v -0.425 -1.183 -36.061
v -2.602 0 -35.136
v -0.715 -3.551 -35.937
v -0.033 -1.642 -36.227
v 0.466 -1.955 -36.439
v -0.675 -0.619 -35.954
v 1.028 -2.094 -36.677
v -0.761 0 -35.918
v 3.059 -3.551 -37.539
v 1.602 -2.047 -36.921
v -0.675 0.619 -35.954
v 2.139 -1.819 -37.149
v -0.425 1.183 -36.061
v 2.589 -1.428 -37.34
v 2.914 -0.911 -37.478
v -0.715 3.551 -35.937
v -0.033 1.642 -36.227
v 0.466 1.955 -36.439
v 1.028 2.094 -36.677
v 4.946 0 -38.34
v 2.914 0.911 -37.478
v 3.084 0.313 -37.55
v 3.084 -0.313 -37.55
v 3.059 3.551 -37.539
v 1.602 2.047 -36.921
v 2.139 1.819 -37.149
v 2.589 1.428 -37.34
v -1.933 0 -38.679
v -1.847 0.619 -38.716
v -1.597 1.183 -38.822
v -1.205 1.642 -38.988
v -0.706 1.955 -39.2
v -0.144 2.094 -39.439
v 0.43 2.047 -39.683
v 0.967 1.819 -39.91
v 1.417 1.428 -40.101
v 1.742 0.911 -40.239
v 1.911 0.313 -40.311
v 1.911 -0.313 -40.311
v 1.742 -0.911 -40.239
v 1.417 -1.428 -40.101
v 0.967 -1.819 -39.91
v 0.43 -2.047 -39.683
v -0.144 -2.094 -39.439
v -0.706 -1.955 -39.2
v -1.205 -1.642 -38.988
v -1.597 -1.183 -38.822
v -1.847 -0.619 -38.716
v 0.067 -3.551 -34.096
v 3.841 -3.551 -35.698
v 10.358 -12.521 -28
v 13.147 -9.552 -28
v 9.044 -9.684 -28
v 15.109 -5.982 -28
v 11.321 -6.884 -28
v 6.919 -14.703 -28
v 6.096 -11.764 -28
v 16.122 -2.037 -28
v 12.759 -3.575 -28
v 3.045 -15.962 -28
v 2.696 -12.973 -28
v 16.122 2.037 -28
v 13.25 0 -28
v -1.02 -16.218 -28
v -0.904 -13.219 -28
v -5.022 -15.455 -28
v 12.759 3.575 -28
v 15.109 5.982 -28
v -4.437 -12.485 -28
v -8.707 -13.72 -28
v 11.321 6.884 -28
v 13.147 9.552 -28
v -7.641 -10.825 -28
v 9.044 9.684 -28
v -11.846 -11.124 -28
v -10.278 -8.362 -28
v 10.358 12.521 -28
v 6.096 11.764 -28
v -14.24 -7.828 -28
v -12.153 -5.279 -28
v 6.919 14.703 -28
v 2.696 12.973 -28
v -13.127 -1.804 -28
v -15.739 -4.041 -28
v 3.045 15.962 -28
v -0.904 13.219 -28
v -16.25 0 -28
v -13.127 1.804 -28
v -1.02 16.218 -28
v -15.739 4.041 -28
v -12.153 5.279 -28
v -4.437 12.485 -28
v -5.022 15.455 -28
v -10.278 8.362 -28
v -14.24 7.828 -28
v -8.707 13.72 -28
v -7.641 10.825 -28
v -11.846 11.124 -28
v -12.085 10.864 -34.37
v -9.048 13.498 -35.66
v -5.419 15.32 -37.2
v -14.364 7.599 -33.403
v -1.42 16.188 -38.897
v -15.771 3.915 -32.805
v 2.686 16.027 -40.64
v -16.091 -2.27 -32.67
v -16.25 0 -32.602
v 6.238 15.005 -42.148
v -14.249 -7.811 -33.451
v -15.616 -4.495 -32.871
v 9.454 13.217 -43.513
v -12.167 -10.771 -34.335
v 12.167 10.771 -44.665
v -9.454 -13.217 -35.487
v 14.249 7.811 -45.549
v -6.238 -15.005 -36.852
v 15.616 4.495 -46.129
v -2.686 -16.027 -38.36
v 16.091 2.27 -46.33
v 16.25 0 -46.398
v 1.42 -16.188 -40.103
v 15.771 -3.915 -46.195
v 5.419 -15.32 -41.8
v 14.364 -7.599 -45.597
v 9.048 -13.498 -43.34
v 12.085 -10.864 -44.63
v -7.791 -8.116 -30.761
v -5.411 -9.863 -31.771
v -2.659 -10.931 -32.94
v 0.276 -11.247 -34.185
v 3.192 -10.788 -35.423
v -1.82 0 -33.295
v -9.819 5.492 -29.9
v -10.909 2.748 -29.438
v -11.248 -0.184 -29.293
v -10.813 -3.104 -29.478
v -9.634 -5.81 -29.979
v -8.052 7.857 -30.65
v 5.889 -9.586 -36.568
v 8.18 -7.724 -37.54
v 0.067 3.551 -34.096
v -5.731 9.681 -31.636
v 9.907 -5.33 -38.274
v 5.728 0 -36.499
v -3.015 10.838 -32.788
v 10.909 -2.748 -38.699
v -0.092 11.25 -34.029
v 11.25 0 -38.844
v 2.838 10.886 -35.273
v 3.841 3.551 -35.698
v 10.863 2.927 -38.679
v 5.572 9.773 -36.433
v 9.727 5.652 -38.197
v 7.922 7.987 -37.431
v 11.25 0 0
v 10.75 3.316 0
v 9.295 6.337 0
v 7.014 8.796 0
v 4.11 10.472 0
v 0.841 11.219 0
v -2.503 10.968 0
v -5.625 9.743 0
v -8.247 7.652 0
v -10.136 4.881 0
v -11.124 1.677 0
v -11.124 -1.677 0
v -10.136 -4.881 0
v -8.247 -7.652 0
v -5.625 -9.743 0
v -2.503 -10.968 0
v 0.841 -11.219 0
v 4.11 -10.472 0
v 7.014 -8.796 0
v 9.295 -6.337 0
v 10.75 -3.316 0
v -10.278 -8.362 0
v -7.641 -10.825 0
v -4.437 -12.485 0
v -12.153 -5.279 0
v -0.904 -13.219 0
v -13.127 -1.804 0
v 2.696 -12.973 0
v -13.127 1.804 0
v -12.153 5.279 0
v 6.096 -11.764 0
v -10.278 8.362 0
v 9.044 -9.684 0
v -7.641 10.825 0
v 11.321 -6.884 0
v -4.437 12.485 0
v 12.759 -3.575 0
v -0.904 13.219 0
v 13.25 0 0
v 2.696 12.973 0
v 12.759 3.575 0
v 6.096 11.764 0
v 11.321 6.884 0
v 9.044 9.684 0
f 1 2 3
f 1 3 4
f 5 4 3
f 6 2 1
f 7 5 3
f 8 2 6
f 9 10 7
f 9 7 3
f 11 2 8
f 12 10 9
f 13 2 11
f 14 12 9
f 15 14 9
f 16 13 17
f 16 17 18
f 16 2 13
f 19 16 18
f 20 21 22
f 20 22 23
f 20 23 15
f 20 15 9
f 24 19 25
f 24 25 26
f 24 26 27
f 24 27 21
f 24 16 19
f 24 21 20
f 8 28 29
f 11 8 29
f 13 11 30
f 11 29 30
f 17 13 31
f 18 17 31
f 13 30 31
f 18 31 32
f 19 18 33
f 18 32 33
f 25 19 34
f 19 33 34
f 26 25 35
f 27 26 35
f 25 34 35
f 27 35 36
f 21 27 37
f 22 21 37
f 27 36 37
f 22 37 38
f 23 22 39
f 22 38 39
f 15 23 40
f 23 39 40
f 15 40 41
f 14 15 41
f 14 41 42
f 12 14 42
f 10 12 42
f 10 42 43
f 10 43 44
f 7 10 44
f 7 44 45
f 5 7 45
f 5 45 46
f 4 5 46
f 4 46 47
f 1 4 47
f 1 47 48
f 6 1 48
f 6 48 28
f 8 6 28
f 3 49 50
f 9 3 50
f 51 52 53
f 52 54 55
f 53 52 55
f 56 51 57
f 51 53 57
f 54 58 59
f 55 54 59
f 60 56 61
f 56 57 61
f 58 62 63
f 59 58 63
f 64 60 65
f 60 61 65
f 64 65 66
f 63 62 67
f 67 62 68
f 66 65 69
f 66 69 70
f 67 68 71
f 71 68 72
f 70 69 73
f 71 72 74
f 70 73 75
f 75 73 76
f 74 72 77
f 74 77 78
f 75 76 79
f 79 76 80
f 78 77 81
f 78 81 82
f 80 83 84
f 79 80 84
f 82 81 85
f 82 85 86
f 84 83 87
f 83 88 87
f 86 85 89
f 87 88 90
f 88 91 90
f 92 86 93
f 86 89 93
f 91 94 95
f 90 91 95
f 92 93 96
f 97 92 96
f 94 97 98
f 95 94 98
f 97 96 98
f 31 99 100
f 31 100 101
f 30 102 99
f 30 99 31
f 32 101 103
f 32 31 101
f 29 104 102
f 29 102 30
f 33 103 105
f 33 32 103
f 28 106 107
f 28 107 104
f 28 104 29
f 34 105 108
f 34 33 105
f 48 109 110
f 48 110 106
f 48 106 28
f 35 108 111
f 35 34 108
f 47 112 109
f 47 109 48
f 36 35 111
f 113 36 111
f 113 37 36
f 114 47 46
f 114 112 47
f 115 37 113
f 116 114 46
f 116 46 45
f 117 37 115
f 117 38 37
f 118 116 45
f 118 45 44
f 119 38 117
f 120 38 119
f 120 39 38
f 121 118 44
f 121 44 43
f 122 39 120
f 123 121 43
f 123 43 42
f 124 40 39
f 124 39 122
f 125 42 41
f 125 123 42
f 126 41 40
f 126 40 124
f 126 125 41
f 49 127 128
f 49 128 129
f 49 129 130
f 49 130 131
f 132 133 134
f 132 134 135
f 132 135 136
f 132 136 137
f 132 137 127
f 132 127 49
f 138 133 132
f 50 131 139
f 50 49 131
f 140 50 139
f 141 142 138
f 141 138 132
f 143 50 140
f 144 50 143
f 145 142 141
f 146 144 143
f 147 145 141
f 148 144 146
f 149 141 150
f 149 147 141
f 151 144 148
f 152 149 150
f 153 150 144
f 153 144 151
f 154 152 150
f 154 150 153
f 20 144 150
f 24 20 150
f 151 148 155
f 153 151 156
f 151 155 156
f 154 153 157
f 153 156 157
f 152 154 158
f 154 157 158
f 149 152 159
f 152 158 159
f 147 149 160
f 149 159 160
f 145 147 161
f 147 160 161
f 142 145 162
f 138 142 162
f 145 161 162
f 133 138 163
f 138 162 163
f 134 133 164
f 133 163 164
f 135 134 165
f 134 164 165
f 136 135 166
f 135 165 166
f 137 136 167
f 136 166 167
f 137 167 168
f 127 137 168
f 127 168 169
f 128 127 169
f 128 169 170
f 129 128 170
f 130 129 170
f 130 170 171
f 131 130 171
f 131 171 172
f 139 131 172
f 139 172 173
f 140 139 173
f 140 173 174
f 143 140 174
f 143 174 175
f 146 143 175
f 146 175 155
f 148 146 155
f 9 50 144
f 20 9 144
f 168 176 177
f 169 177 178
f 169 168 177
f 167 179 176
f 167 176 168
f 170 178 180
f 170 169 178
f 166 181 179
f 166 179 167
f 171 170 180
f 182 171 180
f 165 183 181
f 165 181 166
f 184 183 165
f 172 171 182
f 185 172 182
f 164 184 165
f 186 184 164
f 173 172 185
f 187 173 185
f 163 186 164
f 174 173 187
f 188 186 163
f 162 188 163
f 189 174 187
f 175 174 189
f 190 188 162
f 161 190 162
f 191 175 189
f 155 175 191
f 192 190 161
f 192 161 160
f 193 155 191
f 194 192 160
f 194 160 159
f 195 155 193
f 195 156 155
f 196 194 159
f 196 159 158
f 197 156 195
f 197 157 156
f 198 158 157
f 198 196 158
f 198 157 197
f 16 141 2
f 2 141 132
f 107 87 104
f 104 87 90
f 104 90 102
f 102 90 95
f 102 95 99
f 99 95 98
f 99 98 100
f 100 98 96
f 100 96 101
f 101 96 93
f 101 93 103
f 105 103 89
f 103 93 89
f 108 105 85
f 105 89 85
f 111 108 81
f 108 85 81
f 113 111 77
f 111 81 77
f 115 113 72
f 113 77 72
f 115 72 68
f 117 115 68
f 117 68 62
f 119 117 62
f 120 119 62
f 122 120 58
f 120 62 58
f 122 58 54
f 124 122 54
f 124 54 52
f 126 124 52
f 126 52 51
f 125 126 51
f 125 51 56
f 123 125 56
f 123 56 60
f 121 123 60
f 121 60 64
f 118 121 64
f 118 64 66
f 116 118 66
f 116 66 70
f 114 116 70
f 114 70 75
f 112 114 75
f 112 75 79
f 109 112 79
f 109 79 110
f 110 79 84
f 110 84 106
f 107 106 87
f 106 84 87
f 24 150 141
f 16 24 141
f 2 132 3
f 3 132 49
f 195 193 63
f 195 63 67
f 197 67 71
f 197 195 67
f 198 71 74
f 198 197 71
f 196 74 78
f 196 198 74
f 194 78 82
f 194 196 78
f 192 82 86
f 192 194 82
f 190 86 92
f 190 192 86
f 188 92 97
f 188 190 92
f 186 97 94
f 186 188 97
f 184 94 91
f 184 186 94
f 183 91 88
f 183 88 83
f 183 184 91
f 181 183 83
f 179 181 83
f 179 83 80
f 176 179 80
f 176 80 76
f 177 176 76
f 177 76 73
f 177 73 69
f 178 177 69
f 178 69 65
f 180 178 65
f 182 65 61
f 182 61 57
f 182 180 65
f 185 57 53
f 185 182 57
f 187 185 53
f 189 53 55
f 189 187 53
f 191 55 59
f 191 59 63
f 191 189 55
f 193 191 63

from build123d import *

# Parameters (mm, degrees)
SKETCH2_R               = 13.25
BOSS_EXTRUDE1_DEPTH     = 28
SKETCH3_R               = 16.25
BOSS_EXTRUDE2_DEPTH     = 28
CUT_EXTRUDE1_DEPTH      = 61.532016322
CUT_EXTRUDE1_DEPTH_BACK = 61.532016322
CUT_EXTRUDE2_REACH      = 53.777
SKETCH5_R               = 11.25
SKETCH6_R               = 2.1
CUT_EXTRUDE3_DEPTH      = 5
CUT_EXTRUDE4_DEPTH      = 2


with BuildPart() as part:
    # Sketch2 → Boss-Extrude1 (new body)
    with BuildSketch(Plane.XY):
        Circle(SKETCH2_R)
    extrude(amount=-BOSS_EXTRUDE1_DEPTH)

    # Sketch3 → Boss-Extrude2 (add)
    with BuildSketch(Plane(origin=(0, 0, -28), x_dir=(-1, 0, 0), z_dir=(0, 0, -1))):
        Circle(SKETCH3_R)
    extrude(amount=BOSS_EXTRUDE2_DEPTH)

    # Sketch4 → Cut-Extrude1 (cut, two sides: drawn at the far end of the back side and taken through both)
    with BuildSketch(Plane(origin=(0, 0, 0), x_dir=(1, 0, 0), z_dir=(0, 1, 0)).offset(-CUT_EXTRUDE1_DEPTH_BACK)):
        Polygon((-16.25, 32.602284237), (16.25, 46.397715763), (16.25, 56), (-16.25, 56), align=None)
    extrude(amount=CUT_EXTRUDE1_DEPTH + CUT_EXTRUDE1_DEPTH_BACK, mode=Mode.SUBTRACT)

    # Cut-Extrude2: up to this plane
    cut_extrude2_end = Plane(origin=(-14.296344358, -16.25, -27.999759969), z_dir=(0.3907311284892747, 0, 0.9205048534524399))
    # Sketch5 → Cut-Extrude2 (cut, up to the surface)
    with BuildSketch(Plane.XY, mode=Mode.PRIVATE) as cut_extrude2_sk1:
        Circle(SKETCH5_R)
    cut_extrude2_tool1 = split(extrude(cut_extrude2_sk1.sketch, amount=-CUT_EXTRUDE2_REACH, mode=Mode.PRIVATE), bisect_by=cut_extrude2_end, keep=Keep.BOTH, mode=Mode.PRIVATE)
    add(cut_extrude2_tool1.solids().sort_by_distance((0, 0, 0))[0], mode=Mode.SUBTRACT)

    # Sketch6 → Cut-Extrude3 (cut)
    with BuildSketch(Plane(origin=(-14.206961057, 0, -33.469502817), x_dir=(-0.9205048534524399, 0, 0.3907311284892748), z_dir=(-0.3907311284892748, 0, -0.9205048534524399))):
        with Locations((-15.433879575, 0)):
            Circle(SKETCH6_R)
    extrude(amount=-CUT_EXTRUDE3_DEPTH, mode=Mode.SUBTRACT)

    # Sketch7 → Cut-Extrude4 (cut)
    with BuildSketch(Plane(origin=(-12.253305414, 0, -28.866978549), x_dir=(0.9205048534524399, 0, -0.3907311284892748), z_dir=(0.3907311284892748, 0, 0.9205048534524399))):
        Polygon((19.533879575, 0), (17.483879575, 3.550704156), (13.383879575, 3.550704156), (11.333879575, 0), (13.383879575, -3.550704156), (17.483879575, -3.550704156), align=None)
    extrude(amount=-CUT_EXTRUDE4_DEPTH, mode=Mode.SUBTRACT)


solid = part.part
